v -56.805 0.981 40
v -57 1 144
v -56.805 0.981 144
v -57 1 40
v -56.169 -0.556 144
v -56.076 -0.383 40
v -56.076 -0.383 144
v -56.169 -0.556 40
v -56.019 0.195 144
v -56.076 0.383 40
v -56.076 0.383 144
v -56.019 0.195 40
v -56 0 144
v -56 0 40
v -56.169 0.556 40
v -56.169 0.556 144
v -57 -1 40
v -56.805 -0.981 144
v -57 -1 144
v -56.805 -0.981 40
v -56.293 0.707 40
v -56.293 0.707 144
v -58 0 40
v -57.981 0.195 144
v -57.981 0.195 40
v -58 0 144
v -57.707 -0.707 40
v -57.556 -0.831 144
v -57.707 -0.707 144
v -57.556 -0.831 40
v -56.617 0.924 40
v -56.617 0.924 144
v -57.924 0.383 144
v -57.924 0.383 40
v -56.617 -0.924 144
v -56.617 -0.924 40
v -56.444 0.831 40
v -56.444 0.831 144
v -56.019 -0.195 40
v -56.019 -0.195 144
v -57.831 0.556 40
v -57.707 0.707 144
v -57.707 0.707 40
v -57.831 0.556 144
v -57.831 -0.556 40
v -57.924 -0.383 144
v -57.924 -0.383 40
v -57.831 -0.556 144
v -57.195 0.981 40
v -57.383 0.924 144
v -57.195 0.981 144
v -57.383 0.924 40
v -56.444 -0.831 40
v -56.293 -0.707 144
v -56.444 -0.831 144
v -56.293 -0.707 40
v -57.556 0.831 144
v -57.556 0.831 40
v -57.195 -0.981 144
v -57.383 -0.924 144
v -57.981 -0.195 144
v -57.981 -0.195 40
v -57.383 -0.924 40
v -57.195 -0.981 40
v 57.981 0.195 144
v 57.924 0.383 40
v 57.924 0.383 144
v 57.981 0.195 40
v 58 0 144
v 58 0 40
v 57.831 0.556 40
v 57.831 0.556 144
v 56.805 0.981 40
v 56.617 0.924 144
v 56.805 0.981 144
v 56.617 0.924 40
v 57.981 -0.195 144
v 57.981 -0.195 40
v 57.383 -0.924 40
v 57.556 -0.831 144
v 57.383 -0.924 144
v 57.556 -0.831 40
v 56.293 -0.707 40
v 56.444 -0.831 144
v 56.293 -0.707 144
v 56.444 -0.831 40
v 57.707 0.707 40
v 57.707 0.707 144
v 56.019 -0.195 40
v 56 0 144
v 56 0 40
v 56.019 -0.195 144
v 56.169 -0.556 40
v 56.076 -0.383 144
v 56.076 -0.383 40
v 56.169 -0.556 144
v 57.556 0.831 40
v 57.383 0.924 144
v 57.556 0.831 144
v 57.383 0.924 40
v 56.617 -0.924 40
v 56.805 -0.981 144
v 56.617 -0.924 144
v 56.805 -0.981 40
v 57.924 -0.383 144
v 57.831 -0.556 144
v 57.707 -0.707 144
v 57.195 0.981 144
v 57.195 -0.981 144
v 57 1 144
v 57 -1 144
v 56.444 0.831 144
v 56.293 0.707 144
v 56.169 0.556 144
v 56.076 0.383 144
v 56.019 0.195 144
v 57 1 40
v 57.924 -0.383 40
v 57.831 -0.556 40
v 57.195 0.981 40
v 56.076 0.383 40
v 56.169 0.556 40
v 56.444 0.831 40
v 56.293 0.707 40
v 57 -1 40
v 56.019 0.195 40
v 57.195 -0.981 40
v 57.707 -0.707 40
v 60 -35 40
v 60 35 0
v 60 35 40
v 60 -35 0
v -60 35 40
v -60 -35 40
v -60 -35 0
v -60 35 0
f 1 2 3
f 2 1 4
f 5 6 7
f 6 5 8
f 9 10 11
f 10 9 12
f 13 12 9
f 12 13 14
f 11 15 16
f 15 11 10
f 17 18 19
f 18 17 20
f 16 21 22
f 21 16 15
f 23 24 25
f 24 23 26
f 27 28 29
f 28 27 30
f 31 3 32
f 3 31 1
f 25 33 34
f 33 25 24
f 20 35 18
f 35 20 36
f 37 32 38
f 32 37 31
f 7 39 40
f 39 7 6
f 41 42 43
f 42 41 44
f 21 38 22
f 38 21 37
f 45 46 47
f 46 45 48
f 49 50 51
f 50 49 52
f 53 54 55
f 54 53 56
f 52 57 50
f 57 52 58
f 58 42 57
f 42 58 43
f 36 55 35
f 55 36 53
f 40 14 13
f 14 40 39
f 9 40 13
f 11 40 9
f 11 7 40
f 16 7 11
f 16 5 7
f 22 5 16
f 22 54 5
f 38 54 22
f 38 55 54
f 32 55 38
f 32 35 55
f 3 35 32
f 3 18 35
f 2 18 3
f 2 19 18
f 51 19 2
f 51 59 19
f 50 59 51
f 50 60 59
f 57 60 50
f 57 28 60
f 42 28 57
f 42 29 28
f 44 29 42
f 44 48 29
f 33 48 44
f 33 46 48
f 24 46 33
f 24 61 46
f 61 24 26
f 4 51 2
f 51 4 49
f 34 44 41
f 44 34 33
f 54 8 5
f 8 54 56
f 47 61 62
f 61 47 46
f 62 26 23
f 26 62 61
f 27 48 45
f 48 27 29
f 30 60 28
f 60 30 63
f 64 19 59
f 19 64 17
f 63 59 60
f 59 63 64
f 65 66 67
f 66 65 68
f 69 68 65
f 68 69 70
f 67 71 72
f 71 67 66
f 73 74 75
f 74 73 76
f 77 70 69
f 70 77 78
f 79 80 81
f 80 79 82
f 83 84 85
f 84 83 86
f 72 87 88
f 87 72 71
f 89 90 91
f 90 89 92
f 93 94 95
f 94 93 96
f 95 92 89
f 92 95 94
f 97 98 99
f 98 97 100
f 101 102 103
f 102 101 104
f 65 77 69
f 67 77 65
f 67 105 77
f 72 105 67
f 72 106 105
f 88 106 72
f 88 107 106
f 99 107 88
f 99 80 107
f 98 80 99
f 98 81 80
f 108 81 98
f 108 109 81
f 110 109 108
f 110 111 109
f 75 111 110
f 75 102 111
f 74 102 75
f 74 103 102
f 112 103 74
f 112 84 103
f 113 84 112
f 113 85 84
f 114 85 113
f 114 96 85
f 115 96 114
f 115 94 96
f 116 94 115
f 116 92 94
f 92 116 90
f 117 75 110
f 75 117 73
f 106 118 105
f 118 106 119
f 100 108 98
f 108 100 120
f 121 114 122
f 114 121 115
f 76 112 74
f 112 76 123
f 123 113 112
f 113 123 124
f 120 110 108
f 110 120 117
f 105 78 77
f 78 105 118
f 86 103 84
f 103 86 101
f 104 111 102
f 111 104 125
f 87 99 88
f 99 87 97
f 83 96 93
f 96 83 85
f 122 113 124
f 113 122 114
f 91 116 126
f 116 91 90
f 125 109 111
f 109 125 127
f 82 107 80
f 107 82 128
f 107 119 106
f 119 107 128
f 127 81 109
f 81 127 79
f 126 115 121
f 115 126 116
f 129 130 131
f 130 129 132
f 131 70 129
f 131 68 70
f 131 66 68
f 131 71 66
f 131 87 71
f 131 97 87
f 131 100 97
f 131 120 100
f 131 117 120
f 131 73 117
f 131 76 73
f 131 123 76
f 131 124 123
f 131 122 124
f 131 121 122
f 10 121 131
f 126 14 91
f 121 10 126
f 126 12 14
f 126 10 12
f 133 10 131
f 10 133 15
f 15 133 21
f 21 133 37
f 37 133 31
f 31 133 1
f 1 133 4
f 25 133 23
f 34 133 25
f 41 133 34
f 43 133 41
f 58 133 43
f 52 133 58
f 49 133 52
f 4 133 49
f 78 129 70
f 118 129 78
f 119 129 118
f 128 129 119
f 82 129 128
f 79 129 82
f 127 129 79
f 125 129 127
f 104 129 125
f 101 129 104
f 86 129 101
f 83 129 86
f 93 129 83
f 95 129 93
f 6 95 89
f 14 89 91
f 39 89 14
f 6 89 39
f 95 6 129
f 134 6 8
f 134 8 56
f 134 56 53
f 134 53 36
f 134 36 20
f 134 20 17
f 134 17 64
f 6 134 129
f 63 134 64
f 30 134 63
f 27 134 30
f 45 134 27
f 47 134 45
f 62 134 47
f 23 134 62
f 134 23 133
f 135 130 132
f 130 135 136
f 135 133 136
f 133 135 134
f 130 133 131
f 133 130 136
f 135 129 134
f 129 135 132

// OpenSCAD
// Mini Horizontal Gel Electrophoresis Buffer Tank
// Outer dimensions: 120 (X) x 70 (Y) x 40 (Z)
// Wall thickness: 3 mm
// Floor thickness: 3 mm
// Internal platform: 60 (X) x 70 (Y) x 10 (height from inner floor)
// Centred on origin (X, Y).

$fn = 64;

// Outer dimensions
X_out = 120;
Y_out = 70;
Z_out = 40;

// Thicknesses
wall_t = 3;
floor_t = 3;

// Derived inner dimensions
// Outer box is now centred: -60 to +60 in X.
X_in  = X_out - 2 * wall_t; // 114
Y_in  = Y_out - 2 * wall_t; // 64
Z_in  = Z_out - floor_t;    // 37 (Inner floor is at z=0, top at z=3)

// Platform dimensions
plat_len = 60;
plat_w   = Y_in; // Full inner width
plat_h   = 10;   // Height above inner floor (Top at z = 3 + 10 = 13)

// Electrode hole dimensions
hole_d   = 2;
hole_y   = 0;
hole_z   = 30;   // Height from inner floor (z = 30)

// Main assembly
difference() {
    union() {
        // 1. Tank Shell
        // Outer box centred at origin
        translate([-X_out / 2, -Y_out / 2, 0])
            cube([X_out, Y_out, Z_out]);
        
        // Inner void (air space)
        // Starts at z = floor_t (3)
        // X range: -X_in/2 to +X_in/2
        // Y range: -Y_in/2 to +Y_in/2
        translate([-X_in / 2, -Y_in / 2, floor_t])
            cube([X_in, Y_in, Z_in]);
        
        // 2. Raised Platform
        // Sits on inner floor (z = floor_t)
        // Spans full inner width (Y_in)
        // Centred in X
        // Height plat_h
        translate([-plat_len / 2, -Y_in / 2, floor_t])
            cube([plat_len, plat_w, plat_h]);
        
        // 3. Electrode Holes
        // Two holes, one at each end of the inner tank (X = +/- X_in/2)
        // Horizontal along X axis
        // Position: y = hole_y, z = hole_z (relative to inner floor)
        for (x_pos = [-X_in / 2, X_in / 2]) {
            translate([x_pos, hole_y, hole_z])
                cylinder(h = X_in, d = hole_d, $fn = 32);
        }
    }
}
